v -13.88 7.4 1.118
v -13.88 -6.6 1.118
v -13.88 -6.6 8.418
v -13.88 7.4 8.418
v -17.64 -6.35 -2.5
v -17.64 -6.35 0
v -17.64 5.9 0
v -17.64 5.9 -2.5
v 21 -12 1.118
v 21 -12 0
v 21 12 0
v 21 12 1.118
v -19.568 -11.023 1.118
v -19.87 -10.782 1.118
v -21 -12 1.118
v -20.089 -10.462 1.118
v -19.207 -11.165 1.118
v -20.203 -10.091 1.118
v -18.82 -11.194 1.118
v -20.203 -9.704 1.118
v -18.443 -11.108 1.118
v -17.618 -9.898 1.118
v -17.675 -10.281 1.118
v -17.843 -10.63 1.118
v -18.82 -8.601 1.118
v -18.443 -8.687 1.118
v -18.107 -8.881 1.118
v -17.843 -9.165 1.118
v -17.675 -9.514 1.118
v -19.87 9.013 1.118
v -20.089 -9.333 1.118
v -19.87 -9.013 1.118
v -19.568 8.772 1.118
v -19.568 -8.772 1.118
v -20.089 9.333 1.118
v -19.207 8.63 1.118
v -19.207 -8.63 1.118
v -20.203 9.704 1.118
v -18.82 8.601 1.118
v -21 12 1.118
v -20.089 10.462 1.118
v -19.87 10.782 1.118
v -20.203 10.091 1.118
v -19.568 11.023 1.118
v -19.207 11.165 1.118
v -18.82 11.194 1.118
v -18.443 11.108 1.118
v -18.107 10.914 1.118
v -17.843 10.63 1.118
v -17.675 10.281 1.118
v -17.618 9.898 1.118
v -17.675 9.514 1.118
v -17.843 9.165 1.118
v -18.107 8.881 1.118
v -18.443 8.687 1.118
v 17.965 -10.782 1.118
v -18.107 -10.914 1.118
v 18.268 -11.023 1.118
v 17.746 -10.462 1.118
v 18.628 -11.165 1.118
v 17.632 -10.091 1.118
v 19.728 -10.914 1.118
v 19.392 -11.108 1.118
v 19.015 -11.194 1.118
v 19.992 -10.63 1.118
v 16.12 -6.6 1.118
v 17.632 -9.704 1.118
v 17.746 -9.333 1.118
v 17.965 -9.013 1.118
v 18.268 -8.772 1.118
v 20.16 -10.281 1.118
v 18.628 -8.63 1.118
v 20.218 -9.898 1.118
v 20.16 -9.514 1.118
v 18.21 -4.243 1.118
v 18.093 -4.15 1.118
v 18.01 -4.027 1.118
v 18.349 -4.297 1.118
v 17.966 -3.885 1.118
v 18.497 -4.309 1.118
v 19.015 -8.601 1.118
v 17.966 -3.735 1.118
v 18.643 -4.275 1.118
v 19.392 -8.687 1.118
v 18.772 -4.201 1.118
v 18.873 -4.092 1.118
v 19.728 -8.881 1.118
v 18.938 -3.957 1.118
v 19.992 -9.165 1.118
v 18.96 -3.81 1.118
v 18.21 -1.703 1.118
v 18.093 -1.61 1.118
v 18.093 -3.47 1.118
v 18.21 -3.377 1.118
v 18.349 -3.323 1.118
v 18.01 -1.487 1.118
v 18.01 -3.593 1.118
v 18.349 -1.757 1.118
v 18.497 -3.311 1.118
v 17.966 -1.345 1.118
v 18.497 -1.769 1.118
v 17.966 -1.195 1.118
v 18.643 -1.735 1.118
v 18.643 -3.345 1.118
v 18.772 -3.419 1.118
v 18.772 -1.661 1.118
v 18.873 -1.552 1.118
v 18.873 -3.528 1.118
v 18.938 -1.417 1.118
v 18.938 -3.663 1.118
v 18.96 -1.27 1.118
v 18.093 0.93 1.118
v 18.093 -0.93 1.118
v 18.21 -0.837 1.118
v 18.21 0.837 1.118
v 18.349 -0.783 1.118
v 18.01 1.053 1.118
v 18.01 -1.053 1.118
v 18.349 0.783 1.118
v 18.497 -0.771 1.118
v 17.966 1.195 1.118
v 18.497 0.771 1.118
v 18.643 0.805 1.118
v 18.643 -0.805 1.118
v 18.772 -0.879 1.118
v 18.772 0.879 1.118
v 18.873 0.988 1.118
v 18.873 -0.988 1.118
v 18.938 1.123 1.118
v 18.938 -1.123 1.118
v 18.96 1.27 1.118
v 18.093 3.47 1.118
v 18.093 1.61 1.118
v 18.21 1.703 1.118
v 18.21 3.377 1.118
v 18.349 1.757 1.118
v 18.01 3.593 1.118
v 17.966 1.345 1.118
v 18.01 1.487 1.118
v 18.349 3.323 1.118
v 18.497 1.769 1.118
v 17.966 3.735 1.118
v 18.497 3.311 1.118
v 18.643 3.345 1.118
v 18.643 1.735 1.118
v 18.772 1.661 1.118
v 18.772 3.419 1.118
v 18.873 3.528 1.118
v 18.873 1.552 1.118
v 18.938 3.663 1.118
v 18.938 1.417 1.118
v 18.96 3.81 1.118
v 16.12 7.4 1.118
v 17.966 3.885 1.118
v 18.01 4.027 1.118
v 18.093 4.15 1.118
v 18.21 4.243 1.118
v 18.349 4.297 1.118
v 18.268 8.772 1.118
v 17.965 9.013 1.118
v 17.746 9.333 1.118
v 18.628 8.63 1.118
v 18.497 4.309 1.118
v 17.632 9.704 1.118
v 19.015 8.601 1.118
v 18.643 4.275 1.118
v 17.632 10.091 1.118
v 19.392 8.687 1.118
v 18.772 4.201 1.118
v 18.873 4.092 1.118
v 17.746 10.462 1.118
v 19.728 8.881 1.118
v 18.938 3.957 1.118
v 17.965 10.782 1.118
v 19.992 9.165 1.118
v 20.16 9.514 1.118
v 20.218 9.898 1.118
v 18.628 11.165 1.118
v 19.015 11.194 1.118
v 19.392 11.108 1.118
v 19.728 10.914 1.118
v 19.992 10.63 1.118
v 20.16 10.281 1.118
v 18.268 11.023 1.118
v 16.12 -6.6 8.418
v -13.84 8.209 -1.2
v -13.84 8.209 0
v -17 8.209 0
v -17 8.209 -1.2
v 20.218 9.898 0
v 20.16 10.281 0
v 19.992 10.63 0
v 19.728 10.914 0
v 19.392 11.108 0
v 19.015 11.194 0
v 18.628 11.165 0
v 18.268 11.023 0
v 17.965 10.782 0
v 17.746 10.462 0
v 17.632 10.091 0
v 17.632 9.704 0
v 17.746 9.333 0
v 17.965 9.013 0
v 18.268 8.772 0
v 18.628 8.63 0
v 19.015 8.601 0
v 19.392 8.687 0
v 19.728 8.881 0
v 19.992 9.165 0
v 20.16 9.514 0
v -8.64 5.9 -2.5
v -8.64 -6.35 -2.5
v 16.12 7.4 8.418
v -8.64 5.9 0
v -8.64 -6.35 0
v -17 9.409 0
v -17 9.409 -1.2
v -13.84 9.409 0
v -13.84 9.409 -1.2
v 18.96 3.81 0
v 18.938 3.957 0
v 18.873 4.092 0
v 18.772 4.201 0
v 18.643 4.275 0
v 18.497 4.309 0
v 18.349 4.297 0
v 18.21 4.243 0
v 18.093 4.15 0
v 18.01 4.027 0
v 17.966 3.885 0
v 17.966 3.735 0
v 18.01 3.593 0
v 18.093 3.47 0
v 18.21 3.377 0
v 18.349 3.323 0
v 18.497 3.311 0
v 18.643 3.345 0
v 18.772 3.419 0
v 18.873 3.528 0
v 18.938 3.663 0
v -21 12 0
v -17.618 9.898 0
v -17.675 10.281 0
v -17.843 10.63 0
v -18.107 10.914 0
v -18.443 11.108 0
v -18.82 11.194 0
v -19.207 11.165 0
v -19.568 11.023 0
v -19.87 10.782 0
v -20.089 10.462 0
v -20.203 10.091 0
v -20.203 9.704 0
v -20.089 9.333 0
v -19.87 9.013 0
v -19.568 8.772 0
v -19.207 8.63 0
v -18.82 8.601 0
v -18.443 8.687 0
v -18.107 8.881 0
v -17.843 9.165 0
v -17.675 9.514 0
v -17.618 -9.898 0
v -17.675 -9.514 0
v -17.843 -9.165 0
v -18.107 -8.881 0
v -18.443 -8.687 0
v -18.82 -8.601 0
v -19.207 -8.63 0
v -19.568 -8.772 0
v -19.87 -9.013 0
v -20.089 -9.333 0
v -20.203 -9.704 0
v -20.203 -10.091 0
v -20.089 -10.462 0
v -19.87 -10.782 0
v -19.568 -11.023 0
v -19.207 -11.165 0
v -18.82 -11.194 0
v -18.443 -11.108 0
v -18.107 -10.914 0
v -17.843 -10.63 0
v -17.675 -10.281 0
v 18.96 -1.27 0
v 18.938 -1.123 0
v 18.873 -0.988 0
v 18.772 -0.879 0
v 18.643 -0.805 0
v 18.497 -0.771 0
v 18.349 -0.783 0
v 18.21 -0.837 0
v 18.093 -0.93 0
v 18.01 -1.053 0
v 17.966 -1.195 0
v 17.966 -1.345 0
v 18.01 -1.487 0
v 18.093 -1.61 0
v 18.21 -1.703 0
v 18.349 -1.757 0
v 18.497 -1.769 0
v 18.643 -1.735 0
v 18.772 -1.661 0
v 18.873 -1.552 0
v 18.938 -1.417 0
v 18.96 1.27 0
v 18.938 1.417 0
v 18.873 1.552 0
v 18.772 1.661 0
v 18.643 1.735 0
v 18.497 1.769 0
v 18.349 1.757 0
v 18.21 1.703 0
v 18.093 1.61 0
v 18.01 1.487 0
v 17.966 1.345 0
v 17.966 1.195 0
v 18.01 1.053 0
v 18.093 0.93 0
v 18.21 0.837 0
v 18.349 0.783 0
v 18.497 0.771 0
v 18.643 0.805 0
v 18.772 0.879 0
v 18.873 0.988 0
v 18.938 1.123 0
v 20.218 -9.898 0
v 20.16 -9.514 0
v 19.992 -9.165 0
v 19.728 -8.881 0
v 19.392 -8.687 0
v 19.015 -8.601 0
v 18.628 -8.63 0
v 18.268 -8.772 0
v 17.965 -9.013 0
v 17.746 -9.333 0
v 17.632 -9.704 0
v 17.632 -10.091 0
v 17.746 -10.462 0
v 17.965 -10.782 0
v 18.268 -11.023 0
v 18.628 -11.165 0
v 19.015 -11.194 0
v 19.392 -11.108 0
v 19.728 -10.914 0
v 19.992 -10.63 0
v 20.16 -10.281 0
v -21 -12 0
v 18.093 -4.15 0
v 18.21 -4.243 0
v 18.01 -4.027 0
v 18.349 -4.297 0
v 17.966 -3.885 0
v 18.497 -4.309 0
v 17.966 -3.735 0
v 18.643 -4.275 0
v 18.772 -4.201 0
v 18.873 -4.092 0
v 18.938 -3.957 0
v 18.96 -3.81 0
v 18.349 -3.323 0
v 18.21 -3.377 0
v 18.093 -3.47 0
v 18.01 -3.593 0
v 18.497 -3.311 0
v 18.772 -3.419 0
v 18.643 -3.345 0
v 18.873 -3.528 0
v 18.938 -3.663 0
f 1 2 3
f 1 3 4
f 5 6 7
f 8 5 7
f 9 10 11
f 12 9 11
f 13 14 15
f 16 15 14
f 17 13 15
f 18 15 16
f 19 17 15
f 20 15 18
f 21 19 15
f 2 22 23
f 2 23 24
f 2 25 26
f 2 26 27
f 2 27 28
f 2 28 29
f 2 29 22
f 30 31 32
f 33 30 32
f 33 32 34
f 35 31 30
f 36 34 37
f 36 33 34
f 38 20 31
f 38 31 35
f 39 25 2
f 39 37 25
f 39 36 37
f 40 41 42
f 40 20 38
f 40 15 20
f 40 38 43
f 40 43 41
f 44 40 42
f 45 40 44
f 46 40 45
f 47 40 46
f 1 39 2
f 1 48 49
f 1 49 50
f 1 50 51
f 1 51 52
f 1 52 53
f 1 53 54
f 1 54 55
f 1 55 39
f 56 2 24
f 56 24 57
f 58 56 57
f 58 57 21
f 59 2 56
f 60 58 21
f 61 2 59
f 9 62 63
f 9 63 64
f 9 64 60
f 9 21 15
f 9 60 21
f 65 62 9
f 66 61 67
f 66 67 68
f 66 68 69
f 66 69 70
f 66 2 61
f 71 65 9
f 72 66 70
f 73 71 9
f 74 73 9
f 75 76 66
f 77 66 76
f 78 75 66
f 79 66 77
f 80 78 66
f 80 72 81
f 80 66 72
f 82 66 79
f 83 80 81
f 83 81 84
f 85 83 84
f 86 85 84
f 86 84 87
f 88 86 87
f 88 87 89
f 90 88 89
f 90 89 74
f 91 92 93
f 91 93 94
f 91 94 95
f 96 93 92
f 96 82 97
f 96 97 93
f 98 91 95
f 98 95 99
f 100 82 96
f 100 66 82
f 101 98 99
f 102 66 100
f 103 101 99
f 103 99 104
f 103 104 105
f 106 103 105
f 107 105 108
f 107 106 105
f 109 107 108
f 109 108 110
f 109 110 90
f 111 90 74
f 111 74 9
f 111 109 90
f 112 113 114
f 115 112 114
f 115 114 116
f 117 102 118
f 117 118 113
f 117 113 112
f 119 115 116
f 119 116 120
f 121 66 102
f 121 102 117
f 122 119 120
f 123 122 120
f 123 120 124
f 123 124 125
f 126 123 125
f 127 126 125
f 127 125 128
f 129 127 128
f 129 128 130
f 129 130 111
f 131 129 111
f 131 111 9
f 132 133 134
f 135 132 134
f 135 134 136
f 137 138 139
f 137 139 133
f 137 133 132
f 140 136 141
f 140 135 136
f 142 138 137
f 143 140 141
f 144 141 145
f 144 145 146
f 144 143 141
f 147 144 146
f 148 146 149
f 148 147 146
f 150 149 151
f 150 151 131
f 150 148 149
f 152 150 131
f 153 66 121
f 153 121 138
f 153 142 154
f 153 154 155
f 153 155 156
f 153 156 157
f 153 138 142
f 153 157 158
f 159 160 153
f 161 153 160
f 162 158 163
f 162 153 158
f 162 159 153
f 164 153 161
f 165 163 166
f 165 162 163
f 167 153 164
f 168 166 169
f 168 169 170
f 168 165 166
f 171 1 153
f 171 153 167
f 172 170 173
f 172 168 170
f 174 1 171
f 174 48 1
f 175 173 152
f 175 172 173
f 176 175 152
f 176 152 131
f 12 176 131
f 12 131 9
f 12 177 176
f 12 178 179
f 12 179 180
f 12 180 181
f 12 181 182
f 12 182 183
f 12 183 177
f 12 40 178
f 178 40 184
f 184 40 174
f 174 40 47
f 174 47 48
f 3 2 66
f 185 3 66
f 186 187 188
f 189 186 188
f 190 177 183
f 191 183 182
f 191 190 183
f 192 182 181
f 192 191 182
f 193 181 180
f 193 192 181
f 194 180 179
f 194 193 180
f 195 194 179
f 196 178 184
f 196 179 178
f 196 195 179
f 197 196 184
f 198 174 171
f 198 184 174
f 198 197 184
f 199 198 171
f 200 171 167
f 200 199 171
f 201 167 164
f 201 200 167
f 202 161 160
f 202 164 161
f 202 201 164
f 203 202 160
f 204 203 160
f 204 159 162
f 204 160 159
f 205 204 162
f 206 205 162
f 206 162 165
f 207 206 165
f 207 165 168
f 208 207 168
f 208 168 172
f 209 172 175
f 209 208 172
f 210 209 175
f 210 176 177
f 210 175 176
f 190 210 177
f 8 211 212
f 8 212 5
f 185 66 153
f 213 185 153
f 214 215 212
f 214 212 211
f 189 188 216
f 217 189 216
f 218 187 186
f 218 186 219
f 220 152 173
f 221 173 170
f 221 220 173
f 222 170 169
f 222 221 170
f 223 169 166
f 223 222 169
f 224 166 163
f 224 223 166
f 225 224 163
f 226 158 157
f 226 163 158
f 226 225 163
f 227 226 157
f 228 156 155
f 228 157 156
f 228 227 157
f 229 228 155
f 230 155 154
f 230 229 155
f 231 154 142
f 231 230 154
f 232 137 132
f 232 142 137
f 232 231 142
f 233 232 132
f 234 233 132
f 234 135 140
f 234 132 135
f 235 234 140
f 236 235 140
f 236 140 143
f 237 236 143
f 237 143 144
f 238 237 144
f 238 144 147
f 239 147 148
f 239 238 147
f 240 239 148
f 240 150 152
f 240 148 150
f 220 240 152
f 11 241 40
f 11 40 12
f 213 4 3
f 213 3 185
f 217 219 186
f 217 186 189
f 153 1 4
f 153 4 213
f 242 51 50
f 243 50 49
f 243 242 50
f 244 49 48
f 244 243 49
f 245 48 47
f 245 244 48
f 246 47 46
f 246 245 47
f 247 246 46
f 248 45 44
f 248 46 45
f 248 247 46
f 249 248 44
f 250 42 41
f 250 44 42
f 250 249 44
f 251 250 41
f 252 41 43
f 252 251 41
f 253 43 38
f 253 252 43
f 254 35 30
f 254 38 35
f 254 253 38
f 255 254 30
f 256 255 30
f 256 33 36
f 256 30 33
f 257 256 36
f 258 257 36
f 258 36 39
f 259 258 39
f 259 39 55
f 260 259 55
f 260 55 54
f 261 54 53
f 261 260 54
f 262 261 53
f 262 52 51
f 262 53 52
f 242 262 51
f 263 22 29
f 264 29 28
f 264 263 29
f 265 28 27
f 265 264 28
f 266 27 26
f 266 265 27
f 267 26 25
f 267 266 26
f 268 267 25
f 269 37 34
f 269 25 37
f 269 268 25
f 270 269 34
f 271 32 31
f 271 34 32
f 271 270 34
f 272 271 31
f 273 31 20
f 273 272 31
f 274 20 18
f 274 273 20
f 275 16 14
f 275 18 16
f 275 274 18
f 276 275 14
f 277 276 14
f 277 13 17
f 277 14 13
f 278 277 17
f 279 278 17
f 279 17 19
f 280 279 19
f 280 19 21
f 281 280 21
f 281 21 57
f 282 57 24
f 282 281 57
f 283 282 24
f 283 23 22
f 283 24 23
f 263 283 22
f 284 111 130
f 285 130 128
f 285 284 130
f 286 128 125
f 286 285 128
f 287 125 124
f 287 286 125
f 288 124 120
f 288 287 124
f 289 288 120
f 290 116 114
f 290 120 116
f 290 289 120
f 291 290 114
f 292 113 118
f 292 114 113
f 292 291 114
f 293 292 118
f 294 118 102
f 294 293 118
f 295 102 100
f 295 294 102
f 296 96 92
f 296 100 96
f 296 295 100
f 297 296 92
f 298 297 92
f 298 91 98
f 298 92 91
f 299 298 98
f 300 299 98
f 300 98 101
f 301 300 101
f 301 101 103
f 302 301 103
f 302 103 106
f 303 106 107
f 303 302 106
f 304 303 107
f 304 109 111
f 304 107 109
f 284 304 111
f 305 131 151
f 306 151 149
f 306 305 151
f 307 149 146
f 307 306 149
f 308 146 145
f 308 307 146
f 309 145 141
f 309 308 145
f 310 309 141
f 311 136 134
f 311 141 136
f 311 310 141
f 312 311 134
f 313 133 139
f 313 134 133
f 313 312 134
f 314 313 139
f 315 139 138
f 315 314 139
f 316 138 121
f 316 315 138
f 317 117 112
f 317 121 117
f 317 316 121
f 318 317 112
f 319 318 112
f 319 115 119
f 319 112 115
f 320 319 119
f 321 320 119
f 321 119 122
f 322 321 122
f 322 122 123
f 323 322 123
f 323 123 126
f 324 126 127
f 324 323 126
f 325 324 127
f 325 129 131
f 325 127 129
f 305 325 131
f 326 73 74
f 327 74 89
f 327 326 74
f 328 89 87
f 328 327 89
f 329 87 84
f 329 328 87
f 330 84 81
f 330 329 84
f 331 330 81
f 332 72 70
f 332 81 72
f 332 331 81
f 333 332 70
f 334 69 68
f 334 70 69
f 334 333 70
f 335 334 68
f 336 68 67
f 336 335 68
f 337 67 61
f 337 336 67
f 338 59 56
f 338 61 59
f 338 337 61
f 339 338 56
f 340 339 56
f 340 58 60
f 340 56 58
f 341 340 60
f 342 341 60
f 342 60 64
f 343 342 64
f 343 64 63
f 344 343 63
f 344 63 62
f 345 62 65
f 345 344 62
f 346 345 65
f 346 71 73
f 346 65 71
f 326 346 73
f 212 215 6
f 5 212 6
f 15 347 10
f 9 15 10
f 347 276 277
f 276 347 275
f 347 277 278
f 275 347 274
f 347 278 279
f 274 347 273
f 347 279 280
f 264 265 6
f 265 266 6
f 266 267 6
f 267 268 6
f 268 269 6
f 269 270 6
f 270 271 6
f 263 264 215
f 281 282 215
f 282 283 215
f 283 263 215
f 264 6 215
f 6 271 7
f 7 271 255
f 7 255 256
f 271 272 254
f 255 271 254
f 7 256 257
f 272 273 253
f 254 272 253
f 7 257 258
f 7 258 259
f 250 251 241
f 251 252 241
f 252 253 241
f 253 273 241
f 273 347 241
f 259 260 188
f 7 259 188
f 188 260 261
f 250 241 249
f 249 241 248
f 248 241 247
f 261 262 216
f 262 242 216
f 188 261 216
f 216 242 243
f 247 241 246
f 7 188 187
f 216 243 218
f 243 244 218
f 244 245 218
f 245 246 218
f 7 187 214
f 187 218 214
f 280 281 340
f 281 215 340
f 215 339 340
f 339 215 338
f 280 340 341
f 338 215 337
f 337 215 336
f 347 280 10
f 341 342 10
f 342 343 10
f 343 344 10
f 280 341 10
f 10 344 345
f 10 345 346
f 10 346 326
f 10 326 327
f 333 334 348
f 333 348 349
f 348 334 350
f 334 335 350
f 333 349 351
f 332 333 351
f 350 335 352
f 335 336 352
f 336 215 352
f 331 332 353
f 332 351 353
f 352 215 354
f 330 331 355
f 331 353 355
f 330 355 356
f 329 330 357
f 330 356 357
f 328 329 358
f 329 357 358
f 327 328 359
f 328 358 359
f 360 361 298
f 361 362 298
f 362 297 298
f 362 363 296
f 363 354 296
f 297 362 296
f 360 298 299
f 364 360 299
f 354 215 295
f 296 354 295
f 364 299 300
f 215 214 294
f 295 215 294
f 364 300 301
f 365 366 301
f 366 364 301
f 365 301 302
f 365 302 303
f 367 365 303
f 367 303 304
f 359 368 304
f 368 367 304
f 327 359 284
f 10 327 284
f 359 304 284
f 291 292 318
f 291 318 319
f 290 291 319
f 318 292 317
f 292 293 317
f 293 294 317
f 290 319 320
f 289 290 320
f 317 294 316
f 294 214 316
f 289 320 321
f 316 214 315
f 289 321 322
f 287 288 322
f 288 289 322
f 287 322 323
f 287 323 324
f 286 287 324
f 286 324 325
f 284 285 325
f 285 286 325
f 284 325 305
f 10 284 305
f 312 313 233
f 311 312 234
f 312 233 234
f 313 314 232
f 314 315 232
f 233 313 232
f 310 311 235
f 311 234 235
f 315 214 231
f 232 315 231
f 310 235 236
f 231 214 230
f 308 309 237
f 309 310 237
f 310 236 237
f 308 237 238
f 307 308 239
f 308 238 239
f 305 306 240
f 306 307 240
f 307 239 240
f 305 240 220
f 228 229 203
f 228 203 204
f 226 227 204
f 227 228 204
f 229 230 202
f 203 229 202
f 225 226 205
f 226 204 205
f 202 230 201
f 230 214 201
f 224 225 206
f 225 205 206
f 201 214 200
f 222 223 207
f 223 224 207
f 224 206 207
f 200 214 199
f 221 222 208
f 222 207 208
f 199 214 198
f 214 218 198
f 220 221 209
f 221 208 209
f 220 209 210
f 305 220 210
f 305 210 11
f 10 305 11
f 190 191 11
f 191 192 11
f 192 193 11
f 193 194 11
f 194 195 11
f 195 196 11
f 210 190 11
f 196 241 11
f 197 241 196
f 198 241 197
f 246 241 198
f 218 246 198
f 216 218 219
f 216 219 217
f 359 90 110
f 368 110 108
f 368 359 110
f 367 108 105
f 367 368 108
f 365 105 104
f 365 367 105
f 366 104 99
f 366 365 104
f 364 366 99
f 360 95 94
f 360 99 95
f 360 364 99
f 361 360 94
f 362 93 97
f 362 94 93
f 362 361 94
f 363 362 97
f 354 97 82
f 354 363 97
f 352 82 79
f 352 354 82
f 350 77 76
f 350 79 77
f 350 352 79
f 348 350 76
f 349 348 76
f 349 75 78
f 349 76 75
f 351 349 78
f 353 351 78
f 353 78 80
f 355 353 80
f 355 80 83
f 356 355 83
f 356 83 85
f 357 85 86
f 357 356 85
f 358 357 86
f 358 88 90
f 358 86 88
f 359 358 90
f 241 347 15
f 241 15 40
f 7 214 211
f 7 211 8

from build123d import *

# Parameters (mm, degrees)
SKETCH1_W           = 42
SKETCH1_H           = 24
BOSS_EXTRUDE1_DEPTH = 1.1176
SKETCH2_R           = 1.3
CUT_EXTRUDE1_DEPTH  = 25.21257999
SKETCH3_W           = 30
SKETCH3_H           = 14
BOSS_EXTRUDE2_DEPTH = 7.3
SKETCH4_R           = 0.5
CUT_EXTRUDE2_DEPTH  = 26.609685468
SKETCH5_W           = 9
SKETCH5_H           = 12.25
BOSS_EXTRUDE3_DEPTH = 2.5
SKETCH6_W           = 3.16
SKETCH6_H           = 1.2
BOSS_EXTRUDE4_DEPTH = 1.2


with BuildPart() as part:
    # Sketch1 → Boss-Extrude1 (new body)
    with BuildSketch(Plane.XY):
        Rectangle(SKETCH1_W, SKETCH1_H)
    extrude(amount=BOSS_EXTRUDE1_DEPTH)

    # Sketch2 → Cut-Extrude1 (cut, through all)
    with BuildSketch(Plane.XY):
        with Locations((-18.9175, 9.8975)):
            Circle(SKETCH2_R)
        with Locations((-18.9175, -9.8975)):
            Circle(SKETCH2_R)
        with Locations((18.9175, -9.8975)):
            Circle(SKETCH2_R)
        with Locations((18.9175, 9.8975)):
            Circle(SKETCH2_R)
    extrude(amount=CUT_EXTRUDE1_DEPTH, mode=Mode.SUBTRACT)

    # Sketch3 → Boss-Extrude2 (add)
    with BuildSketch(Plane.XY.offset(1.1176)):
        with Locations((1.12, 0.4)):
            Rectangle(SKETCH3_W, SKETCH3_H)
    extrude(amount=BOSS_EXTRUDE2_DEPTH)

    # Sketch4 → Cut-Extrude2 (cut, through all)
    with BuildSketch(Plane.XY):
        with Locations((18.46, 3.81)):
            Circle(SKETCH4_R)
        with Locations((18.46, 1.27)):
            Circle(SKETCH4_R)
        with Locations((18.46, -1.27)):
            Circle(SKETCH4_R)
        with Locations((18.46, -3.81)):
            Circle(SKETCH4_R)
    extrude(amount=CUT_EXTRUDE2_DEPTH, mode=Mode.SUBTRACT)

    # Sketch5 → Boss-Extrude3 (add)
    with BuildSketch(Plane(origin=(0, 0, 0), x_dir=(-1, 0, 0), z_dir=(0, 0, -1))):
        with Locations((13.14, -0.225)):
            Rectangle(SKETCH5_W, SKETCH5_H)
    extrude(amount=BOSS_EXTRUDE3_DEPTH)

    # Sketch6 → Boss-Extrude4 (add)
    with BuildSketch(Plane(origin=(0, 0, 0), x_dir=(-1, 0, 0), z_dir=(0, 0, -1))):
        with Locations((15.42, 8.8092)):
            Rectangle(SKETCH6_W, SKETCH6_H)
    extrude(amount=BOSS_EXTRUDE4_DEPTH)


solid = part.part
